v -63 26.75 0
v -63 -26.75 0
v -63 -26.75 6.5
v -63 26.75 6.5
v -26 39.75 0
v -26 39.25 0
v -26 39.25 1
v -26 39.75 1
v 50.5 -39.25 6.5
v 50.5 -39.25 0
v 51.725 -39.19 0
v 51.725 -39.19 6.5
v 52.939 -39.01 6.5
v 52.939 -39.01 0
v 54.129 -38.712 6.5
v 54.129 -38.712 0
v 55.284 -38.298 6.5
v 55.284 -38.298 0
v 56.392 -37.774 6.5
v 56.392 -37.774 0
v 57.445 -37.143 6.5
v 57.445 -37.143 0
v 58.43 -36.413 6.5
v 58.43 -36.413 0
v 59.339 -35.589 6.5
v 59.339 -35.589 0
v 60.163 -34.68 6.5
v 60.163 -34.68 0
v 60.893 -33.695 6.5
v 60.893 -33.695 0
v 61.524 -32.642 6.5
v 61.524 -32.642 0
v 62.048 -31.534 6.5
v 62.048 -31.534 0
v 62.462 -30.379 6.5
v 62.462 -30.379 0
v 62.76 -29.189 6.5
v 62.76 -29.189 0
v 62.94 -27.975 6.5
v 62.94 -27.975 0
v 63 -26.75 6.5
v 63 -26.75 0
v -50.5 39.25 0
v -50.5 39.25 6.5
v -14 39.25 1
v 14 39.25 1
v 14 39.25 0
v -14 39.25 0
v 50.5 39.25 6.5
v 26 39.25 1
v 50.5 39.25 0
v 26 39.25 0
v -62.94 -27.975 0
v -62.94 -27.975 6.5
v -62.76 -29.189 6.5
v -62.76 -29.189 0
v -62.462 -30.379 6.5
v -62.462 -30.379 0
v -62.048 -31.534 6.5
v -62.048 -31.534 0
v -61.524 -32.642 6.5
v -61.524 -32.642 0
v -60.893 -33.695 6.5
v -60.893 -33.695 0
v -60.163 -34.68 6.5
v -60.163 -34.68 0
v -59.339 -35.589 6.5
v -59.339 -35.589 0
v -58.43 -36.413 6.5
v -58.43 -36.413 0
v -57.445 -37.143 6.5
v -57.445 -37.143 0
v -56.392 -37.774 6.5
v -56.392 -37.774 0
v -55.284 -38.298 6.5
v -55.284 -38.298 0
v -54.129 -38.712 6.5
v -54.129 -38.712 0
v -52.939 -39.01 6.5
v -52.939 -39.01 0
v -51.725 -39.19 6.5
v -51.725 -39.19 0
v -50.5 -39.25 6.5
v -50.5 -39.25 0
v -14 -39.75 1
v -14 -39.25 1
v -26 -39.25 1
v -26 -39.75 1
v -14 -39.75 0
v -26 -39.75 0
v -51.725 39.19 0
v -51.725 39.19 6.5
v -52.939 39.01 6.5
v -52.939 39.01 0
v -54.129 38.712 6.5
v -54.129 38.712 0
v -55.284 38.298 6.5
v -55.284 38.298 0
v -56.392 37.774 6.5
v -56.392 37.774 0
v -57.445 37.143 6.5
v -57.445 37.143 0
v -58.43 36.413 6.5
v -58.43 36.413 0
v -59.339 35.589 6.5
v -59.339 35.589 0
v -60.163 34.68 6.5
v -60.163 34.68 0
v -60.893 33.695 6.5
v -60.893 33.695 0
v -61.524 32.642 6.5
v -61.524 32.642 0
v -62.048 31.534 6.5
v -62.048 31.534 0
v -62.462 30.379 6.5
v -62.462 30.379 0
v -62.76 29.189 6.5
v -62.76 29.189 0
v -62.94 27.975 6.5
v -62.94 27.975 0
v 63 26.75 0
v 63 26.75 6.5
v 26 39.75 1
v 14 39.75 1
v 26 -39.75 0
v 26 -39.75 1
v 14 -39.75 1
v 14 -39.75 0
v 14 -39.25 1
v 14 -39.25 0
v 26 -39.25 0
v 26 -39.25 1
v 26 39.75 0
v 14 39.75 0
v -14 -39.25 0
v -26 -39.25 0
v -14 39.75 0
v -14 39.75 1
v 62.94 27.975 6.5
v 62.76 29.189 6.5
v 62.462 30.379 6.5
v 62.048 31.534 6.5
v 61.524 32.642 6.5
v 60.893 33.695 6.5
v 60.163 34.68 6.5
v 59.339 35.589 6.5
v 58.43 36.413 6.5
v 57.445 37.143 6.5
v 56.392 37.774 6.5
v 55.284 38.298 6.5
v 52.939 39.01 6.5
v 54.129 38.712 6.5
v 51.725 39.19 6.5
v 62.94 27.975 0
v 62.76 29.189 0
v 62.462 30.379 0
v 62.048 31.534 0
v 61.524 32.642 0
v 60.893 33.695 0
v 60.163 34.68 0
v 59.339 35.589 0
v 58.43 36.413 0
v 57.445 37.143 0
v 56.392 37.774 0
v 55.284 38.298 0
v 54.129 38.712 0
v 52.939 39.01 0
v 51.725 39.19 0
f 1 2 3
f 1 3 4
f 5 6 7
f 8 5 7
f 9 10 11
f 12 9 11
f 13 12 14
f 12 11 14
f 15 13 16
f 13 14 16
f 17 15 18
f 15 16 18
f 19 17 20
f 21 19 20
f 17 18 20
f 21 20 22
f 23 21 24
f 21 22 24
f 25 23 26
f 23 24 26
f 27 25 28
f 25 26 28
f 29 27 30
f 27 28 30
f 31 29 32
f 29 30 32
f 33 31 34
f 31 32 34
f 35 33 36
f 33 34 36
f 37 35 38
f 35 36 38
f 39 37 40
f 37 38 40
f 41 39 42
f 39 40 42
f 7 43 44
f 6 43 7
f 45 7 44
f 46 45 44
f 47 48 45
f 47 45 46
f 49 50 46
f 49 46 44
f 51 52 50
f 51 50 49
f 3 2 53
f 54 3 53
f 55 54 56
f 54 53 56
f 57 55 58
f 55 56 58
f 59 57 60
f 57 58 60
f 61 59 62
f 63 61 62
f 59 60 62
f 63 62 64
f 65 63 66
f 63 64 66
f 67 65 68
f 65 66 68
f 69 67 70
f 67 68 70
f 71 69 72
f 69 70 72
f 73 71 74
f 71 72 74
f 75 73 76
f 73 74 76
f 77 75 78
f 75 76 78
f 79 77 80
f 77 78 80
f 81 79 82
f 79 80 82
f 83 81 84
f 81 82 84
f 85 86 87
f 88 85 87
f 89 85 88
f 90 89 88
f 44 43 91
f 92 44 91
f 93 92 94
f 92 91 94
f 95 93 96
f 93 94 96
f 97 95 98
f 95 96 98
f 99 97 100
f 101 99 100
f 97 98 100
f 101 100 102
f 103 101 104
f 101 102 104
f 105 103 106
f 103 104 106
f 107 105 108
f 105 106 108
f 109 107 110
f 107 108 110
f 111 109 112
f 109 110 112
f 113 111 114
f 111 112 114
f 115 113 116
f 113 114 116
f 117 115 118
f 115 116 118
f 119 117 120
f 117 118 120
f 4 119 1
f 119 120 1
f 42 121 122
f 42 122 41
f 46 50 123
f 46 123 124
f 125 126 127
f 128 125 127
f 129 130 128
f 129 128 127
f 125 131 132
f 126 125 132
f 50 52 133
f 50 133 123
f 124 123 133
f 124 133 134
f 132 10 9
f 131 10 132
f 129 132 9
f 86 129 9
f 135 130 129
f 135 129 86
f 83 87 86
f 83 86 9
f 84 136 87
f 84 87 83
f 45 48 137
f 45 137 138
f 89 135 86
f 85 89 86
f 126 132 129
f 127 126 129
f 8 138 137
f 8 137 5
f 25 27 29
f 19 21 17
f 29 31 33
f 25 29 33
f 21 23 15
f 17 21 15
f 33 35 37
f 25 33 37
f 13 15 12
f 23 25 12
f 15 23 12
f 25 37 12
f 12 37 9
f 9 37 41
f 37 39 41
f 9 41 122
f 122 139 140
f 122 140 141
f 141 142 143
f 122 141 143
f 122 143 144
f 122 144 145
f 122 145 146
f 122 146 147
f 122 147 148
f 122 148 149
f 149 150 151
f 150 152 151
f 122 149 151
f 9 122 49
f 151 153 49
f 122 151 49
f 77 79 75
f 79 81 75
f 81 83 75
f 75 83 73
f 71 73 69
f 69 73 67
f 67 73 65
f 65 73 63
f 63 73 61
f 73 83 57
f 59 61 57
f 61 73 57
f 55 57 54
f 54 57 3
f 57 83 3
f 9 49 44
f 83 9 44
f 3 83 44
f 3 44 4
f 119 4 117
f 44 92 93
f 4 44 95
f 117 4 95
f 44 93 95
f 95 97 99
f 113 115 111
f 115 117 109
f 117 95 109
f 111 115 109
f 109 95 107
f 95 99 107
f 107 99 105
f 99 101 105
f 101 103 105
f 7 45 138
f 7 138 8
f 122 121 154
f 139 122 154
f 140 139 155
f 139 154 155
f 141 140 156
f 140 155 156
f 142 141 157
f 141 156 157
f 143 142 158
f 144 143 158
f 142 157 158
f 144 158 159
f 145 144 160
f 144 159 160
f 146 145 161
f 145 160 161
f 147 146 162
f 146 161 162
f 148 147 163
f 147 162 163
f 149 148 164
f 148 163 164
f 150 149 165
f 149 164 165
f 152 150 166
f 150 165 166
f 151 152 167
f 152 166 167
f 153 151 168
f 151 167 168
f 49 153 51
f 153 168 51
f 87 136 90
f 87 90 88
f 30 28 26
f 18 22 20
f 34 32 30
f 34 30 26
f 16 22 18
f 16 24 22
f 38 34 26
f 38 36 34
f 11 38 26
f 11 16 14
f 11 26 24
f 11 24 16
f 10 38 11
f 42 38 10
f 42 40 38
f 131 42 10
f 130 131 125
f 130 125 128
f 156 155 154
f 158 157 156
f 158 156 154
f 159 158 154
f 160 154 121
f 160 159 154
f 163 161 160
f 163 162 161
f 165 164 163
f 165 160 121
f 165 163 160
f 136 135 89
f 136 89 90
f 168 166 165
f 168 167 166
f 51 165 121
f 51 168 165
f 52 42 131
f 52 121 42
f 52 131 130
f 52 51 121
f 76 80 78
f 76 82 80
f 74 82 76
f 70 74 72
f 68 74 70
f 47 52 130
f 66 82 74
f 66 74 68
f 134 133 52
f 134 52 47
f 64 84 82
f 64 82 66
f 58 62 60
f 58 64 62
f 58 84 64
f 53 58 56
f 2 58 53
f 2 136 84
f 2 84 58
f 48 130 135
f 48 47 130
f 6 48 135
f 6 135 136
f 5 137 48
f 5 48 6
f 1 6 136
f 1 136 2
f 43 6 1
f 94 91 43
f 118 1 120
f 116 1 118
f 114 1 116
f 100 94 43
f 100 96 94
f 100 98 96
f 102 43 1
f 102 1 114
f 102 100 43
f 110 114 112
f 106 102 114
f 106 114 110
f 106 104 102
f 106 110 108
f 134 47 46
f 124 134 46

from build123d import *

# Parameters (mm, degrees)
PAD_DEPTH    = 1
PAD001_DEPTH = 6.5
SKETCH001_W  = 12
SKETCH001_H  = 1
PAD002_DEPTH = 0.5


with BuildPart() as part:
    # Sketch → Pad (new body)
    with BuildSketch(Plane.XY):
        with BuildLine():
            Line((-50.5, 39.25), (50.5, 39.25))
            ThreePointArc((63, 26.75), (59.338835, 35.588835), (50.5, 39.25))
            Line((63, 26.75), (63, -26.75))
            ThreePointArc((50.5, -39.25), (59.338835, -35.588835), (63, -26.75))
            Line((50.5, -39.25), (-50.5, -39.25))
            ThreePointArc((-63, -26.75), (-59.338835, -35.588835), (-50.5, -39.25))
            Line((-63, -26.75), (-63, 26.75))
            ThreePointArc((-50.5, 39.25), (-59.338835, 35.588835), (-63, 26.75))
        make_face()
    extrude(amount=PAD_DEPTH)

    # Sketch → Pad001 (join)
    with BuildSketch(Plane.XY):
        with BuildLine():
            Line((-50.5, 39.25), (50.5, 39.25))
            ThreePointArc((63, 26.75), (59.338835, 35.588835), (50.5, 39.25))
            Line((63, 26.75), (63, -26.75))
            ThreePointArc((50.5, -39.25), (59.338835, -35.588835), (63, -26.75))
            Line((50.5, -39.25), (-50.5, -39.25))
            ThreePointArc((-63, -26.75), (-59.338835, -35.588835), (-50.5, -39.25))
            Line((-63, -26.75), (-63, 26.75))
            ThreePointArc((-50.5, 39.25), (-59.338835, 35.588835), (-63, 26.75))
        make_face()
    extrude(amount=PAD001_DEPTH)

    # Sketch001 (on Face15 of Pad001) → Pad002 (join)
    with BuildSketch(Plane(origin=(0, 39.25, 0), x_dir=(-1, 0, 0), z_dir=(0, 1, 0))):
        with Locations((-20, 0.5)):
            Rectangle(SKETCH001_W, SKETCH001_H)
        with Locations((20, 0.5)):
            Rectangle(SKETCH001_W, SKETCH001_H)
    pad002 = extrude(amount=PAD002_DEPTH)

    # Mirrored: Pad002 across XZ
    add(pad002.mirror(Plane.XZ))


solid = part.part
